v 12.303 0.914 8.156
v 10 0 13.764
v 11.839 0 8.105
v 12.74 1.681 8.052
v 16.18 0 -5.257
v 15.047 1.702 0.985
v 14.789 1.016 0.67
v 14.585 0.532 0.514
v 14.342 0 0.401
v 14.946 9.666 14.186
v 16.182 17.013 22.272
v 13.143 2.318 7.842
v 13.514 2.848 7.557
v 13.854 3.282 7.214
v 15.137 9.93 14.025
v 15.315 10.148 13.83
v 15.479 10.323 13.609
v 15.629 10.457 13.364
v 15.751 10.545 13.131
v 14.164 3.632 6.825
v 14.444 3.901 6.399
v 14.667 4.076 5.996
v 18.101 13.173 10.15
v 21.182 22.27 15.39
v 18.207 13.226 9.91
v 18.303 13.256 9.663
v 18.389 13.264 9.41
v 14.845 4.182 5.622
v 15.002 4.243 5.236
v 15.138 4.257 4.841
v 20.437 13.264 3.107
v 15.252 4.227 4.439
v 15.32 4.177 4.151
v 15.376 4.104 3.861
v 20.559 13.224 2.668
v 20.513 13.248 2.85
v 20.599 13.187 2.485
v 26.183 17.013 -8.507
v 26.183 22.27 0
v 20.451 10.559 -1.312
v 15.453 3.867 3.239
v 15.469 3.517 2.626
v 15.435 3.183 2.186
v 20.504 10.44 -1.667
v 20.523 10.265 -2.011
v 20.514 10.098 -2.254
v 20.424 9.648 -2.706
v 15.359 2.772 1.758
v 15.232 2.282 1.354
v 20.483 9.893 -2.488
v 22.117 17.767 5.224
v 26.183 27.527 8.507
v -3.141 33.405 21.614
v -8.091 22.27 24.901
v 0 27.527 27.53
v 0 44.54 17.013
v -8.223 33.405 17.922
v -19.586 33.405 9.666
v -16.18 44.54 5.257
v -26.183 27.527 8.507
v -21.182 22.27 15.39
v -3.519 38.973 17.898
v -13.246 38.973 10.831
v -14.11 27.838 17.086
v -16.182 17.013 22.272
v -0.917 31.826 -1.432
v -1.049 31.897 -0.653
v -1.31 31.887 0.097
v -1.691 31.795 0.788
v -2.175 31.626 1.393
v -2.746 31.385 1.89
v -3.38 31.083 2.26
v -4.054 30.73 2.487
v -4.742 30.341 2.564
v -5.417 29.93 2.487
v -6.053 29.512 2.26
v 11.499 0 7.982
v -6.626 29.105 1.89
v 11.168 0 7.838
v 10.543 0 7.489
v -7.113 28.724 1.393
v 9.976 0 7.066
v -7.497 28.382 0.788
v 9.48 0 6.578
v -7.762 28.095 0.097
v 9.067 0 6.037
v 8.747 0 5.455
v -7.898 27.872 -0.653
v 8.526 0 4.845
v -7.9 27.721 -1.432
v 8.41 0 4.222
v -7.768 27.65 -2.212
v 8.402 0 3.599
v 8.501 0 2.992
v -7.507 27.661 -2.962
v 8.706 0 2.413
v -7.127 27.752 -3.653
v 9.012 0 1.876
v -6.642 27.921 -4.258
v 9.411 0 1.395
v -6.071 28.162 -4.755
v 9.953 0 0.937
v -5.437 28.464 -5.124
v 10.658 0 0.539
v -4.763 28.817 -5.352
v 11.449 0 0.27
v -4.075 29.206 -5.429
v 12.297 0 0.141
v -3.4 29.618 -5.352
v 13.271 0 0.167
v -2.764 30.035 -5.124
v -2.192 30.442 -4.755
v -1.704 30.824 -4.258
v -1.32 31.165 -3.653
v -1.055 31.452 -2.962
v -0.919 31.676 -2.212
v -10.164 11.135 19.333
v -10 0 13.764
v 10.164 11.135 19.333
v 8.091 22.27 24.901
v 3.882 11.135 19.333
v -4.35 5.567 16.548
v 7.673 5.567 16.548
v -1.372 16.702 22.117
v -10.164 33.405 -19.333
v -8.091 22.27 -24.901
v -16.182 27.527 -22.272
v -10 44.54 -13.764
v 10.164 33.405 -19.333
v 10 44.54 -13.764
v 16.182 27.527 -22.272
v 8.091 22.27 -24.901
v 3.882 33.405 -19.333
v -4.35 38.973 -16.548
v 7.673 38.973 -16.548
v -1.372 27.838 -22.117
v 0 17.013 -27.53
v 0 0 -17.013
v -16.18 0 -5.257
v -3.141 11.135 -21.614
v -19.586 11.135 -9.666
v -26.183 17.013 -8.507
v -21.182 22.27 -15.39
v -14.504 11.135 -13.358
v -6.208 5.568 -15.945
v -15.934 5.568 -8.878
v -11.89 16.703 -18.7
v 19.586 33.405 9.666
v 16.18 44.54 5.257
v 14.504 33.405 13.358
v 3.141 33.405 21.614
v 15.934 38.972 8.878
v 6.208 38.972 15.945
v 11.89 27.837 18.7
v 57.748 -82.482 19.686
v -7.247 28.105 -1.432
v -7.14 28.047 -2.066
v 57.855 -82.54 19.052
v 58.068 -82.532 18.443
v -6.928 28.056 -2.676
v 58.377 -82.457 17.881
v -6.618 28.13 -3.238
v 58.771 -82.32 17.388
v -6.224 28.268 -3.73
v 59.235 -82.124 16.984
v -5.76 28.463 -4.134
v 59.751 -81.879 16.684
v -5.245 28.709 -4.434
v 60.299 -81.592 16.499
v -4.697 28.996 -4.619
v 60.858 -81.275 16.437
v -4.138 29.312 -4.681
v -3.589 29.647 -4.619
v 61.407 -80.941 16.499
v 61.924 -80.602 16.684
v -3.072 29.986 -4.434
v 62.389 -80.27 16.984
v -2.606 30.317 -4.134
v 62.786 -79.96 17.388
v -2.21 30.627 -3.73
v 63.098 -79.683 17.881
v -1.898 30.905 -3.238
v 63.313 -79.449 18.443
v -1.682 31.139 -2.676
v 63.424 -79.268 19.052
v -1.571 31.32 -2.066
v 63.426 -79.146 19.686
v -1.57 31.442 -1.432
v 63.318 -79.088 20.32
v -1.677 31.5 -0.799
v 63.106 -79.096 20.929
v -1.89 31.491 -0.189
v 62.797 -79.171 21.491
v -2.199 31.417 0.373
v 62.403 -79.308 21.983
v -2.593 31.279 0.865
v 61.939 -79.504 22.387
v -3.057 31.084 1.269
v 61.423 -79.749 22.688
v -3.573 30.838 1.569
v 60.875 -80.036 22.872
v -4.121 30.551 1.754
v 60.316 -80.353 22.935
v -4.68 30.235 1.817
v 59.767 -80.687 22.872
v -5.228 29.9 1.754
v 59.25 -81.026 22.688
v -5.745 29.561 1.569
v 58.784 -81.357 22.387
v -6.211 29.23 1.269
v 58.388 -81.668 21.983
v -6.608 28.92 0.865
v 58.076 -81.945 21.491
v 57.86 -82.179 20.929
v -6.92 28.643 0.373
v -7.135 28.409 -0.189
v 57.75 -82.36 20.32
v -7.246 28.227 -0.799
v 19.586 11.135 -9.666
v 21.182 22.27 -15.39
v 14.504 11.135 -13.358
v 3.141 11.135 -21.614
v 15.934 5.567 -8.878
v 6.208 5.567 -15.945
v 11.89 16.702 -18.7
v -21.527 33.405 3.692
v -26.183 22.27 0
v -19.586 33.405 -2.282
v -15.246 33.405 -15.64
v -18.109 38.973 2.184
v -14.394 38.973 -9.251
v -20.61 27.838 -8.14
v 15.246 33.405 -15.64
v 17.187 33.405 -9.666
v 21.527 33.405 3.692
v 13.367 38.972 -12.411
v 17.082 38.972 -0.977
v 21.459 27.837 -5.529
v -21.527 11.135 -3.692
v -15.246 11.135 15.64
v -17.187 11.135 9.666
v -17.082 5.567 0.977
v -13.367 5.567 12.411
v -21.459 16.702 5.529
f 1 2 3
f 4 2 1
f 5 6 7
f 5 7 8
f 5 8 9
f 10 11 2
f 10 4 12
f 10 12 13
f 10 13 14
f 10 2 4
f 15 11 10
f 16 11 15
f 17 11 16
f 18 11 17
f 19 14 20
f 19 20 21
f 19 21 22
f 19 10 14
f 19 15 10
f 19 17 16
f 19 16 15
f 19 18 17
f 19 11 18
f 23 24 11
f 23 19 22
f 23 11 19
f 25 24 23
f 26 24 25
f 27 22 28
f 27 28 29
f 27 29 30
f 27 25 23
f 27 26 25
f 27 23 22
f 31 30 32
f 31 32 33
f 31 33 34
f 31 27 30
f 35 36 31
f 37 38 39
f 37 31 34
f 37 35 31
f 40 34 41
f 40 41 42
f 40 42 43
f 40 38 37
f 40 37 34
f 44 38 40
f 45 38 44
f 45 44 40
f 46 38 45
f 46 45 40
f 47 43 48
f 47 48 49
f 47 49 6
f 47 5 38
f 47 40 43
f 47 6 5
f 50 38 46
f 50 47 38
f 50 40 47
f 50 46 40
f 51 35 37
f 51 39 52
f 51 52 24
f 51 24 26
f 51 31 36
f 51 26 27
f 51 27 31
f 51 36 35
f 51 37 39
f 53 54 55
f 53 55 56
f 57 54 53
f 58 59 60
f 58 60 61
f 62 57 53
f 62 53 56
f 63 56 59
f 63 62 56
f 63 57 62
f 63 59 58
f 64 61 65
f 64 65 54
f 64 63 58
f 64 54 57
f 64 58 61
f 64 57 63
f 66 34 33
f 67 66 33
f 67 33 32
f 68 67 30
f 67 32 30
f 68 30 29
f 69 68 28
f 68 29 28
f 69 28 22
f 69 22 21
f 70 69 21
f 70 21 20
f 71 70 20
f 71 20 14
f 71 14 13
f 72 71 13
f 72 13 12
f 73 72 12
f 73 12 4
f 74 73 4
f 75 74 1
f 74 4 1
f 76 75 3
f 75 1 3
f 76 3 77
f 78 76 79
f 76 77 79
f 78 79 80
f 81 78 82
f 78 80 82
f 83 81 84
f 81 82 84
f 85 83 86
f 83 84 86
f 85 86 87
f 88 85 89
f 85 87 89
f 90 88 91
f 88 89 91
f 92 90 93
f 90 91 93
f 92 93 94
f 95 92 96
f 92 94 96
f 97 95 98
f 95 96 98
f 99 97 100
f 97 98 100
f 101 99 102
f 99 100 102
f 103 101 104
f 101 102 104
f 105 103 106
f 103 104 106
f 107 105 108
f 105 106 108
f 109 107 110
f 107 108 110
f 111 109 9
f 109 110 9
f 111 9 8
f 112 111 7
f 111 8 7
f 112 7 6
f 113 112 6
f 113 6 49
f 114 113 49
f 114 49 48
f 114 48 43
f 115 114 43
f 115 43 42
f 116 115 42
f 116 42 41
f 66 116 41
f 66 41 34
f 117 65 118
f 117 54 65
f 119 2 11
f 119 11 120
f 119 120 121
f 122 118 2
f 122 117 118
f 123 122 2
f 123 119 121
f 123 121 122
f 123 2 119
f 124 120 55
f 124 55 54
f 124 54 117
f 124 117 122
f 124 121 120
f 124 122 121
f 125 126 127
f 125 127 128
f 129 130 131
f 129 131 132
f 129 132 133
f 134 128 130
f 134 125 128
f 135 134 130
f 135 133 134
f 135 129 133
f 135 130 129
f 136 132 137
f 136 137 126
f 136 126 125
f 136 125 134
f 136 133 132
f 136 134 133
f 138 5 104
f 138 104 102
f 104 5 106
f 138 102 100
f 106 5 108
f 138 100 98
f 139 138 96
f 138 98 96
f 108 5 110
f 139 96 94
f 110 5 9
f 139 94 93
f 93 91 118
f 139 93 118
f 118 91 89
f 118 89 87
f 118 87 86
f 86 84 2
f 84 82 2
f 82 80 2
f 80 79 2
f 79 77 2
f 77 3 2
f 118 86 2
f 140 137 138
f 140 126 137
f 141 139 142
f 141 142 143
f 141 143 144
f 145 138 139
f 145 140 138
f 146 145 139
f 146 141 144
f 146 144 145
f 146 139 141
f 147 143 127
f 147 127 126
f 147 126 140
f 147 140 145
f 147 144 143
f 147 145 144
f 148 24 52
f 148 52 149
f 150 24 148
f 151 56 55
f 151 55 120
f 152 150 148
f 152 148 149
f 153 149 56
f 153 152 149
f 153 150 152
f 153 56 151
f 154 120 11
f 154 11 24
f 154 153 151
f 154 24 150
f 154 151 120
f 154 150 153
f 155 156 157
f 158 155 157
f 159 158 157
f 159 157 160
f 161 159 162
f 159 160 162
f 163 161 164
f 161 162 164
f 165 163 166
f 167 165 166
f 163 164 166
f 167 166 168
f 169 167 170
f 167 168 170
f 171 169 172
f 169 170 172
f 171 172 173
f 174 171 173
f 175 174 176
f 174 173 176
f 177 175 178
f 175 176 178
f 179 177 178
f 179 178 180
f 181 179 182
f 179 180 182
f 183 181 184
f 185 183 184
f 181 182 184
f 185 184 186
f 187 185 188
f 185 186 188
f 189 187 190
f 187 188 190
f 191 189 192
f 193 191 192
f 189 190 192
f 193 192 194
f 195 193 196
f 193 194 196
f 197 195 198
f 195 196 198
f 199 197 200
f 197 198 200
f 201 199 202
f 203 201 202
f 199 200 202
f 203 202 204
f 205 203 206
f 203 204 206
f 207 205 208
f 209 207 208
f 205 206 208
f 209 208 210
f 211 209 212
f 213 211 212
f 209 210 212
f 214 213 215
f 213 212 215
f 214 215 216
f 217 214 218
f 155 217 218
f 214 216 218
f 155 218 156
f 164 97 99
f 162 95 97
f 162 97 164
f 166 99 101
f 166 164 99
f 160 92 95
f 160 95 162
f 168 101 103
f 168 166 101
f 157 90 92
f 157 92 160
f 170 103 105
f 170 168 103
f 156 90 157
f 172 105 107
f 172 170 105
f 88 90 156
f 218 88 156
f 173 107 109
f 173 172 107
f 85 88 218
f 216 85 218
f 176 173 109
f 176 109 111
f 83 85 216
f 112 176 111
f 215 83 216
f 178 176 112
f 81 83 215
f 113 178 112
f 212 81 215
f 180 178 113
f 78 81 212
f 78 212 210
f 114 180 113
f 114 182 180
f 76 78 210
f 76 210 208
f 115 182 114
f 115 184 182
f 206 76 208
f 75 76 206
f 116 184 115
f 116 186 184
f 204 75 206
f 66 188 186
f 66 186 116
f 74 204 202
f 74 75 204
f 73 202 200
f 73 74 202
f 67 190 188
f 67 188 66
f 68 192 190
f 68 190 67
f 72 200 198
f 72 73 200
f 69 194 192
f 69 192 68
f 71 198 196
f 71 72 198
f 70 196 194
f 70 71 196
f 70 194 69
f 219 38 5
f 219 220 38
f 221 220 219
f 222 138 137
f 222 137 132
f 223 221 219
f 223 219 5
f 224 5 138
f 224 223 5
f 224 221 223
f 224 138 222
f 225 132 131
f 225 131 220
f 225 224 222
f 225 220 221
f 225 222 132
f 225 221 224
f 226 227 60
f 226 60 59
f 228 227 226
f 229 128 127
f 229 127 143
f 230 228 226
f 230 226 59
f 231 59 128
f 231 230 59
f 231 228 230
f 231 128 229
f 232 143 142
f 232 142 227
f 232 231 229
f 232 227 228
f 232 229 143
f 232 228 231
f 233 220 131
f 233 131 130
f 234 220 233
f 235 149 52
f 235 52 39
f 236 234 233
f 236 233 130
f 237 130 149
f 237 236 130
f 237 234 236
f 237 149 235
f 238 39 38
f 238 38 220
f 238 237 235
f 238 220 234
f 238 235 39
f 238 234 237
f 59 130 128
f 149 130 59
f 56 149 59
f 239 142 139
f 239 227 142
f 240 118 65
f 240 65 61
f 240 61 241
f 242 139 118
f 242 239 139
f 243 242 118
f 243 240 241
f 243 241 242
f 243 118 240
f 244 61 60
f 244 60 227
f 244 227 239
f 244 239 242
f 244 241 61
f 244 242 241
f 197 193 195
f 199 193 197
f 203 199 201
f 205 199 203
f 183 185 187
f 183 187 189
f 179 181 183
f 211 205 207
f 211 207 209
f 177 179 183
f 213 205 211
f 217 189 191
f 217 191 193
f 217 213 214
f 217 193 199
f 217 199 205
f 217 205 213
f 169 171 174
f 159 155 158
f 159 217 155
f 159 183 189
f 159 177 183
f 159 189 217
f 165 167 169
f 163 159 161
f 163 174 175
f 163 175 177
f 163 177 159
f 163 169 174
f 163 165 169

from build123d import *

# Parameters (mm, degrees)
BOSS_EXTRUDE1_DEPTH = 44.54
BOSS_EXTRUDE1_TAPER = -26.57
SKETCH2_OUTSIDE_W   = 156.308
SKETCH2_OUTSIDE_H   = 152.161
CUT_EXTRUDE1_DEPTH  = 44.54
CUT_EXTRUDE1_TAPER  = 26.57
SKETCH3_R           = 4.05
CUT_EXTRUDE2_DEPTH  = 35
SKETCH4_R           = 3.292788119
BOSS_EXTRUDE2_DEPTH = 130


with BuildPart() as part:
    # Sketch1 → Boss-Extrude1 (new body)
    with BuildSketch(Plane(origin=(0, 0, 0), x_dir=(1, 0, 0), z_dir=(0, 1, 0))):
        Polygon((0, 17.013016167), (-16.180339887, 5.257311121), (-10, -13.763819205), (10, -13.763819205), (16.180339887, 5.257311121), align=None)
    extrude(amount=BOSS_EXTRUDE1_DEPTH, taper=BOSS_EXTRUDE1_TAPER)

    # Sketch2 outside → Cut-Extrude1 (cut)
    with BuildSketch(Plane(origin=(0, 44.54, 0), x_dir=(1, 0, 0), z_dir=(0, 1, 0))):
        with Locations((0, 4.2535)):
            Rectangle(SKETCH2_OUTSIDE_W, SKETCH2_OUTSIDE_H)
        Polygon((0, -17.013016167), (16.180339887, -5.257311121), (10, 13.763819205), (-10, 13.763819205), (-16.180339887, -5.257311121), align=None, mode=Mode.SUBTRACT)
    extrude(amount=-CUT_EXTRUDE1_DEPTH, taper=CUT_EXTRUDE1_TAPER, mode=Mode.SUBTRACT)

    # Sketch3 → Cut-Extrude2 (cut)
    with BuildSketch(Plane(origin=(3.617528362, -6.155101222, 1.175406216), x_dir=(0.4408232334814932, 0.08851114782998275, -0.8932192639731522), z_dir=(0.49996506081853154, -0.8506735121122296, 0.16244849568822295))):
        with Locations(Location((1.971362597, 11.541364145, 0), (0, 0, 64.856110881))):
            Circle(SKETCH3_R)
    extrude(amount=-CUT_EXTRUDE2_DEPTH, mode=Mode.SUBTRACT)

    # Sketch4 → Boss-Extrude2 (add)
    with BuildSketch(Plane(origin=(-13.881248767, 23.618471702, -4.510291133), x_dir=(0.8660455749905556, 0.49109082304882484, -0.09378094452769076), z_dir=(0.49996506081853154, -0.8506735121122294, 0.16244849568822292))):
        with Locations(Location((10.937809574, 4.177759991, 0), (0, 0, 185.453817967))):
            Circle(SKETCH4_R)
    extrude(amount=BOSS_EXTRUDE2_DEPTH)


solid = part.part
